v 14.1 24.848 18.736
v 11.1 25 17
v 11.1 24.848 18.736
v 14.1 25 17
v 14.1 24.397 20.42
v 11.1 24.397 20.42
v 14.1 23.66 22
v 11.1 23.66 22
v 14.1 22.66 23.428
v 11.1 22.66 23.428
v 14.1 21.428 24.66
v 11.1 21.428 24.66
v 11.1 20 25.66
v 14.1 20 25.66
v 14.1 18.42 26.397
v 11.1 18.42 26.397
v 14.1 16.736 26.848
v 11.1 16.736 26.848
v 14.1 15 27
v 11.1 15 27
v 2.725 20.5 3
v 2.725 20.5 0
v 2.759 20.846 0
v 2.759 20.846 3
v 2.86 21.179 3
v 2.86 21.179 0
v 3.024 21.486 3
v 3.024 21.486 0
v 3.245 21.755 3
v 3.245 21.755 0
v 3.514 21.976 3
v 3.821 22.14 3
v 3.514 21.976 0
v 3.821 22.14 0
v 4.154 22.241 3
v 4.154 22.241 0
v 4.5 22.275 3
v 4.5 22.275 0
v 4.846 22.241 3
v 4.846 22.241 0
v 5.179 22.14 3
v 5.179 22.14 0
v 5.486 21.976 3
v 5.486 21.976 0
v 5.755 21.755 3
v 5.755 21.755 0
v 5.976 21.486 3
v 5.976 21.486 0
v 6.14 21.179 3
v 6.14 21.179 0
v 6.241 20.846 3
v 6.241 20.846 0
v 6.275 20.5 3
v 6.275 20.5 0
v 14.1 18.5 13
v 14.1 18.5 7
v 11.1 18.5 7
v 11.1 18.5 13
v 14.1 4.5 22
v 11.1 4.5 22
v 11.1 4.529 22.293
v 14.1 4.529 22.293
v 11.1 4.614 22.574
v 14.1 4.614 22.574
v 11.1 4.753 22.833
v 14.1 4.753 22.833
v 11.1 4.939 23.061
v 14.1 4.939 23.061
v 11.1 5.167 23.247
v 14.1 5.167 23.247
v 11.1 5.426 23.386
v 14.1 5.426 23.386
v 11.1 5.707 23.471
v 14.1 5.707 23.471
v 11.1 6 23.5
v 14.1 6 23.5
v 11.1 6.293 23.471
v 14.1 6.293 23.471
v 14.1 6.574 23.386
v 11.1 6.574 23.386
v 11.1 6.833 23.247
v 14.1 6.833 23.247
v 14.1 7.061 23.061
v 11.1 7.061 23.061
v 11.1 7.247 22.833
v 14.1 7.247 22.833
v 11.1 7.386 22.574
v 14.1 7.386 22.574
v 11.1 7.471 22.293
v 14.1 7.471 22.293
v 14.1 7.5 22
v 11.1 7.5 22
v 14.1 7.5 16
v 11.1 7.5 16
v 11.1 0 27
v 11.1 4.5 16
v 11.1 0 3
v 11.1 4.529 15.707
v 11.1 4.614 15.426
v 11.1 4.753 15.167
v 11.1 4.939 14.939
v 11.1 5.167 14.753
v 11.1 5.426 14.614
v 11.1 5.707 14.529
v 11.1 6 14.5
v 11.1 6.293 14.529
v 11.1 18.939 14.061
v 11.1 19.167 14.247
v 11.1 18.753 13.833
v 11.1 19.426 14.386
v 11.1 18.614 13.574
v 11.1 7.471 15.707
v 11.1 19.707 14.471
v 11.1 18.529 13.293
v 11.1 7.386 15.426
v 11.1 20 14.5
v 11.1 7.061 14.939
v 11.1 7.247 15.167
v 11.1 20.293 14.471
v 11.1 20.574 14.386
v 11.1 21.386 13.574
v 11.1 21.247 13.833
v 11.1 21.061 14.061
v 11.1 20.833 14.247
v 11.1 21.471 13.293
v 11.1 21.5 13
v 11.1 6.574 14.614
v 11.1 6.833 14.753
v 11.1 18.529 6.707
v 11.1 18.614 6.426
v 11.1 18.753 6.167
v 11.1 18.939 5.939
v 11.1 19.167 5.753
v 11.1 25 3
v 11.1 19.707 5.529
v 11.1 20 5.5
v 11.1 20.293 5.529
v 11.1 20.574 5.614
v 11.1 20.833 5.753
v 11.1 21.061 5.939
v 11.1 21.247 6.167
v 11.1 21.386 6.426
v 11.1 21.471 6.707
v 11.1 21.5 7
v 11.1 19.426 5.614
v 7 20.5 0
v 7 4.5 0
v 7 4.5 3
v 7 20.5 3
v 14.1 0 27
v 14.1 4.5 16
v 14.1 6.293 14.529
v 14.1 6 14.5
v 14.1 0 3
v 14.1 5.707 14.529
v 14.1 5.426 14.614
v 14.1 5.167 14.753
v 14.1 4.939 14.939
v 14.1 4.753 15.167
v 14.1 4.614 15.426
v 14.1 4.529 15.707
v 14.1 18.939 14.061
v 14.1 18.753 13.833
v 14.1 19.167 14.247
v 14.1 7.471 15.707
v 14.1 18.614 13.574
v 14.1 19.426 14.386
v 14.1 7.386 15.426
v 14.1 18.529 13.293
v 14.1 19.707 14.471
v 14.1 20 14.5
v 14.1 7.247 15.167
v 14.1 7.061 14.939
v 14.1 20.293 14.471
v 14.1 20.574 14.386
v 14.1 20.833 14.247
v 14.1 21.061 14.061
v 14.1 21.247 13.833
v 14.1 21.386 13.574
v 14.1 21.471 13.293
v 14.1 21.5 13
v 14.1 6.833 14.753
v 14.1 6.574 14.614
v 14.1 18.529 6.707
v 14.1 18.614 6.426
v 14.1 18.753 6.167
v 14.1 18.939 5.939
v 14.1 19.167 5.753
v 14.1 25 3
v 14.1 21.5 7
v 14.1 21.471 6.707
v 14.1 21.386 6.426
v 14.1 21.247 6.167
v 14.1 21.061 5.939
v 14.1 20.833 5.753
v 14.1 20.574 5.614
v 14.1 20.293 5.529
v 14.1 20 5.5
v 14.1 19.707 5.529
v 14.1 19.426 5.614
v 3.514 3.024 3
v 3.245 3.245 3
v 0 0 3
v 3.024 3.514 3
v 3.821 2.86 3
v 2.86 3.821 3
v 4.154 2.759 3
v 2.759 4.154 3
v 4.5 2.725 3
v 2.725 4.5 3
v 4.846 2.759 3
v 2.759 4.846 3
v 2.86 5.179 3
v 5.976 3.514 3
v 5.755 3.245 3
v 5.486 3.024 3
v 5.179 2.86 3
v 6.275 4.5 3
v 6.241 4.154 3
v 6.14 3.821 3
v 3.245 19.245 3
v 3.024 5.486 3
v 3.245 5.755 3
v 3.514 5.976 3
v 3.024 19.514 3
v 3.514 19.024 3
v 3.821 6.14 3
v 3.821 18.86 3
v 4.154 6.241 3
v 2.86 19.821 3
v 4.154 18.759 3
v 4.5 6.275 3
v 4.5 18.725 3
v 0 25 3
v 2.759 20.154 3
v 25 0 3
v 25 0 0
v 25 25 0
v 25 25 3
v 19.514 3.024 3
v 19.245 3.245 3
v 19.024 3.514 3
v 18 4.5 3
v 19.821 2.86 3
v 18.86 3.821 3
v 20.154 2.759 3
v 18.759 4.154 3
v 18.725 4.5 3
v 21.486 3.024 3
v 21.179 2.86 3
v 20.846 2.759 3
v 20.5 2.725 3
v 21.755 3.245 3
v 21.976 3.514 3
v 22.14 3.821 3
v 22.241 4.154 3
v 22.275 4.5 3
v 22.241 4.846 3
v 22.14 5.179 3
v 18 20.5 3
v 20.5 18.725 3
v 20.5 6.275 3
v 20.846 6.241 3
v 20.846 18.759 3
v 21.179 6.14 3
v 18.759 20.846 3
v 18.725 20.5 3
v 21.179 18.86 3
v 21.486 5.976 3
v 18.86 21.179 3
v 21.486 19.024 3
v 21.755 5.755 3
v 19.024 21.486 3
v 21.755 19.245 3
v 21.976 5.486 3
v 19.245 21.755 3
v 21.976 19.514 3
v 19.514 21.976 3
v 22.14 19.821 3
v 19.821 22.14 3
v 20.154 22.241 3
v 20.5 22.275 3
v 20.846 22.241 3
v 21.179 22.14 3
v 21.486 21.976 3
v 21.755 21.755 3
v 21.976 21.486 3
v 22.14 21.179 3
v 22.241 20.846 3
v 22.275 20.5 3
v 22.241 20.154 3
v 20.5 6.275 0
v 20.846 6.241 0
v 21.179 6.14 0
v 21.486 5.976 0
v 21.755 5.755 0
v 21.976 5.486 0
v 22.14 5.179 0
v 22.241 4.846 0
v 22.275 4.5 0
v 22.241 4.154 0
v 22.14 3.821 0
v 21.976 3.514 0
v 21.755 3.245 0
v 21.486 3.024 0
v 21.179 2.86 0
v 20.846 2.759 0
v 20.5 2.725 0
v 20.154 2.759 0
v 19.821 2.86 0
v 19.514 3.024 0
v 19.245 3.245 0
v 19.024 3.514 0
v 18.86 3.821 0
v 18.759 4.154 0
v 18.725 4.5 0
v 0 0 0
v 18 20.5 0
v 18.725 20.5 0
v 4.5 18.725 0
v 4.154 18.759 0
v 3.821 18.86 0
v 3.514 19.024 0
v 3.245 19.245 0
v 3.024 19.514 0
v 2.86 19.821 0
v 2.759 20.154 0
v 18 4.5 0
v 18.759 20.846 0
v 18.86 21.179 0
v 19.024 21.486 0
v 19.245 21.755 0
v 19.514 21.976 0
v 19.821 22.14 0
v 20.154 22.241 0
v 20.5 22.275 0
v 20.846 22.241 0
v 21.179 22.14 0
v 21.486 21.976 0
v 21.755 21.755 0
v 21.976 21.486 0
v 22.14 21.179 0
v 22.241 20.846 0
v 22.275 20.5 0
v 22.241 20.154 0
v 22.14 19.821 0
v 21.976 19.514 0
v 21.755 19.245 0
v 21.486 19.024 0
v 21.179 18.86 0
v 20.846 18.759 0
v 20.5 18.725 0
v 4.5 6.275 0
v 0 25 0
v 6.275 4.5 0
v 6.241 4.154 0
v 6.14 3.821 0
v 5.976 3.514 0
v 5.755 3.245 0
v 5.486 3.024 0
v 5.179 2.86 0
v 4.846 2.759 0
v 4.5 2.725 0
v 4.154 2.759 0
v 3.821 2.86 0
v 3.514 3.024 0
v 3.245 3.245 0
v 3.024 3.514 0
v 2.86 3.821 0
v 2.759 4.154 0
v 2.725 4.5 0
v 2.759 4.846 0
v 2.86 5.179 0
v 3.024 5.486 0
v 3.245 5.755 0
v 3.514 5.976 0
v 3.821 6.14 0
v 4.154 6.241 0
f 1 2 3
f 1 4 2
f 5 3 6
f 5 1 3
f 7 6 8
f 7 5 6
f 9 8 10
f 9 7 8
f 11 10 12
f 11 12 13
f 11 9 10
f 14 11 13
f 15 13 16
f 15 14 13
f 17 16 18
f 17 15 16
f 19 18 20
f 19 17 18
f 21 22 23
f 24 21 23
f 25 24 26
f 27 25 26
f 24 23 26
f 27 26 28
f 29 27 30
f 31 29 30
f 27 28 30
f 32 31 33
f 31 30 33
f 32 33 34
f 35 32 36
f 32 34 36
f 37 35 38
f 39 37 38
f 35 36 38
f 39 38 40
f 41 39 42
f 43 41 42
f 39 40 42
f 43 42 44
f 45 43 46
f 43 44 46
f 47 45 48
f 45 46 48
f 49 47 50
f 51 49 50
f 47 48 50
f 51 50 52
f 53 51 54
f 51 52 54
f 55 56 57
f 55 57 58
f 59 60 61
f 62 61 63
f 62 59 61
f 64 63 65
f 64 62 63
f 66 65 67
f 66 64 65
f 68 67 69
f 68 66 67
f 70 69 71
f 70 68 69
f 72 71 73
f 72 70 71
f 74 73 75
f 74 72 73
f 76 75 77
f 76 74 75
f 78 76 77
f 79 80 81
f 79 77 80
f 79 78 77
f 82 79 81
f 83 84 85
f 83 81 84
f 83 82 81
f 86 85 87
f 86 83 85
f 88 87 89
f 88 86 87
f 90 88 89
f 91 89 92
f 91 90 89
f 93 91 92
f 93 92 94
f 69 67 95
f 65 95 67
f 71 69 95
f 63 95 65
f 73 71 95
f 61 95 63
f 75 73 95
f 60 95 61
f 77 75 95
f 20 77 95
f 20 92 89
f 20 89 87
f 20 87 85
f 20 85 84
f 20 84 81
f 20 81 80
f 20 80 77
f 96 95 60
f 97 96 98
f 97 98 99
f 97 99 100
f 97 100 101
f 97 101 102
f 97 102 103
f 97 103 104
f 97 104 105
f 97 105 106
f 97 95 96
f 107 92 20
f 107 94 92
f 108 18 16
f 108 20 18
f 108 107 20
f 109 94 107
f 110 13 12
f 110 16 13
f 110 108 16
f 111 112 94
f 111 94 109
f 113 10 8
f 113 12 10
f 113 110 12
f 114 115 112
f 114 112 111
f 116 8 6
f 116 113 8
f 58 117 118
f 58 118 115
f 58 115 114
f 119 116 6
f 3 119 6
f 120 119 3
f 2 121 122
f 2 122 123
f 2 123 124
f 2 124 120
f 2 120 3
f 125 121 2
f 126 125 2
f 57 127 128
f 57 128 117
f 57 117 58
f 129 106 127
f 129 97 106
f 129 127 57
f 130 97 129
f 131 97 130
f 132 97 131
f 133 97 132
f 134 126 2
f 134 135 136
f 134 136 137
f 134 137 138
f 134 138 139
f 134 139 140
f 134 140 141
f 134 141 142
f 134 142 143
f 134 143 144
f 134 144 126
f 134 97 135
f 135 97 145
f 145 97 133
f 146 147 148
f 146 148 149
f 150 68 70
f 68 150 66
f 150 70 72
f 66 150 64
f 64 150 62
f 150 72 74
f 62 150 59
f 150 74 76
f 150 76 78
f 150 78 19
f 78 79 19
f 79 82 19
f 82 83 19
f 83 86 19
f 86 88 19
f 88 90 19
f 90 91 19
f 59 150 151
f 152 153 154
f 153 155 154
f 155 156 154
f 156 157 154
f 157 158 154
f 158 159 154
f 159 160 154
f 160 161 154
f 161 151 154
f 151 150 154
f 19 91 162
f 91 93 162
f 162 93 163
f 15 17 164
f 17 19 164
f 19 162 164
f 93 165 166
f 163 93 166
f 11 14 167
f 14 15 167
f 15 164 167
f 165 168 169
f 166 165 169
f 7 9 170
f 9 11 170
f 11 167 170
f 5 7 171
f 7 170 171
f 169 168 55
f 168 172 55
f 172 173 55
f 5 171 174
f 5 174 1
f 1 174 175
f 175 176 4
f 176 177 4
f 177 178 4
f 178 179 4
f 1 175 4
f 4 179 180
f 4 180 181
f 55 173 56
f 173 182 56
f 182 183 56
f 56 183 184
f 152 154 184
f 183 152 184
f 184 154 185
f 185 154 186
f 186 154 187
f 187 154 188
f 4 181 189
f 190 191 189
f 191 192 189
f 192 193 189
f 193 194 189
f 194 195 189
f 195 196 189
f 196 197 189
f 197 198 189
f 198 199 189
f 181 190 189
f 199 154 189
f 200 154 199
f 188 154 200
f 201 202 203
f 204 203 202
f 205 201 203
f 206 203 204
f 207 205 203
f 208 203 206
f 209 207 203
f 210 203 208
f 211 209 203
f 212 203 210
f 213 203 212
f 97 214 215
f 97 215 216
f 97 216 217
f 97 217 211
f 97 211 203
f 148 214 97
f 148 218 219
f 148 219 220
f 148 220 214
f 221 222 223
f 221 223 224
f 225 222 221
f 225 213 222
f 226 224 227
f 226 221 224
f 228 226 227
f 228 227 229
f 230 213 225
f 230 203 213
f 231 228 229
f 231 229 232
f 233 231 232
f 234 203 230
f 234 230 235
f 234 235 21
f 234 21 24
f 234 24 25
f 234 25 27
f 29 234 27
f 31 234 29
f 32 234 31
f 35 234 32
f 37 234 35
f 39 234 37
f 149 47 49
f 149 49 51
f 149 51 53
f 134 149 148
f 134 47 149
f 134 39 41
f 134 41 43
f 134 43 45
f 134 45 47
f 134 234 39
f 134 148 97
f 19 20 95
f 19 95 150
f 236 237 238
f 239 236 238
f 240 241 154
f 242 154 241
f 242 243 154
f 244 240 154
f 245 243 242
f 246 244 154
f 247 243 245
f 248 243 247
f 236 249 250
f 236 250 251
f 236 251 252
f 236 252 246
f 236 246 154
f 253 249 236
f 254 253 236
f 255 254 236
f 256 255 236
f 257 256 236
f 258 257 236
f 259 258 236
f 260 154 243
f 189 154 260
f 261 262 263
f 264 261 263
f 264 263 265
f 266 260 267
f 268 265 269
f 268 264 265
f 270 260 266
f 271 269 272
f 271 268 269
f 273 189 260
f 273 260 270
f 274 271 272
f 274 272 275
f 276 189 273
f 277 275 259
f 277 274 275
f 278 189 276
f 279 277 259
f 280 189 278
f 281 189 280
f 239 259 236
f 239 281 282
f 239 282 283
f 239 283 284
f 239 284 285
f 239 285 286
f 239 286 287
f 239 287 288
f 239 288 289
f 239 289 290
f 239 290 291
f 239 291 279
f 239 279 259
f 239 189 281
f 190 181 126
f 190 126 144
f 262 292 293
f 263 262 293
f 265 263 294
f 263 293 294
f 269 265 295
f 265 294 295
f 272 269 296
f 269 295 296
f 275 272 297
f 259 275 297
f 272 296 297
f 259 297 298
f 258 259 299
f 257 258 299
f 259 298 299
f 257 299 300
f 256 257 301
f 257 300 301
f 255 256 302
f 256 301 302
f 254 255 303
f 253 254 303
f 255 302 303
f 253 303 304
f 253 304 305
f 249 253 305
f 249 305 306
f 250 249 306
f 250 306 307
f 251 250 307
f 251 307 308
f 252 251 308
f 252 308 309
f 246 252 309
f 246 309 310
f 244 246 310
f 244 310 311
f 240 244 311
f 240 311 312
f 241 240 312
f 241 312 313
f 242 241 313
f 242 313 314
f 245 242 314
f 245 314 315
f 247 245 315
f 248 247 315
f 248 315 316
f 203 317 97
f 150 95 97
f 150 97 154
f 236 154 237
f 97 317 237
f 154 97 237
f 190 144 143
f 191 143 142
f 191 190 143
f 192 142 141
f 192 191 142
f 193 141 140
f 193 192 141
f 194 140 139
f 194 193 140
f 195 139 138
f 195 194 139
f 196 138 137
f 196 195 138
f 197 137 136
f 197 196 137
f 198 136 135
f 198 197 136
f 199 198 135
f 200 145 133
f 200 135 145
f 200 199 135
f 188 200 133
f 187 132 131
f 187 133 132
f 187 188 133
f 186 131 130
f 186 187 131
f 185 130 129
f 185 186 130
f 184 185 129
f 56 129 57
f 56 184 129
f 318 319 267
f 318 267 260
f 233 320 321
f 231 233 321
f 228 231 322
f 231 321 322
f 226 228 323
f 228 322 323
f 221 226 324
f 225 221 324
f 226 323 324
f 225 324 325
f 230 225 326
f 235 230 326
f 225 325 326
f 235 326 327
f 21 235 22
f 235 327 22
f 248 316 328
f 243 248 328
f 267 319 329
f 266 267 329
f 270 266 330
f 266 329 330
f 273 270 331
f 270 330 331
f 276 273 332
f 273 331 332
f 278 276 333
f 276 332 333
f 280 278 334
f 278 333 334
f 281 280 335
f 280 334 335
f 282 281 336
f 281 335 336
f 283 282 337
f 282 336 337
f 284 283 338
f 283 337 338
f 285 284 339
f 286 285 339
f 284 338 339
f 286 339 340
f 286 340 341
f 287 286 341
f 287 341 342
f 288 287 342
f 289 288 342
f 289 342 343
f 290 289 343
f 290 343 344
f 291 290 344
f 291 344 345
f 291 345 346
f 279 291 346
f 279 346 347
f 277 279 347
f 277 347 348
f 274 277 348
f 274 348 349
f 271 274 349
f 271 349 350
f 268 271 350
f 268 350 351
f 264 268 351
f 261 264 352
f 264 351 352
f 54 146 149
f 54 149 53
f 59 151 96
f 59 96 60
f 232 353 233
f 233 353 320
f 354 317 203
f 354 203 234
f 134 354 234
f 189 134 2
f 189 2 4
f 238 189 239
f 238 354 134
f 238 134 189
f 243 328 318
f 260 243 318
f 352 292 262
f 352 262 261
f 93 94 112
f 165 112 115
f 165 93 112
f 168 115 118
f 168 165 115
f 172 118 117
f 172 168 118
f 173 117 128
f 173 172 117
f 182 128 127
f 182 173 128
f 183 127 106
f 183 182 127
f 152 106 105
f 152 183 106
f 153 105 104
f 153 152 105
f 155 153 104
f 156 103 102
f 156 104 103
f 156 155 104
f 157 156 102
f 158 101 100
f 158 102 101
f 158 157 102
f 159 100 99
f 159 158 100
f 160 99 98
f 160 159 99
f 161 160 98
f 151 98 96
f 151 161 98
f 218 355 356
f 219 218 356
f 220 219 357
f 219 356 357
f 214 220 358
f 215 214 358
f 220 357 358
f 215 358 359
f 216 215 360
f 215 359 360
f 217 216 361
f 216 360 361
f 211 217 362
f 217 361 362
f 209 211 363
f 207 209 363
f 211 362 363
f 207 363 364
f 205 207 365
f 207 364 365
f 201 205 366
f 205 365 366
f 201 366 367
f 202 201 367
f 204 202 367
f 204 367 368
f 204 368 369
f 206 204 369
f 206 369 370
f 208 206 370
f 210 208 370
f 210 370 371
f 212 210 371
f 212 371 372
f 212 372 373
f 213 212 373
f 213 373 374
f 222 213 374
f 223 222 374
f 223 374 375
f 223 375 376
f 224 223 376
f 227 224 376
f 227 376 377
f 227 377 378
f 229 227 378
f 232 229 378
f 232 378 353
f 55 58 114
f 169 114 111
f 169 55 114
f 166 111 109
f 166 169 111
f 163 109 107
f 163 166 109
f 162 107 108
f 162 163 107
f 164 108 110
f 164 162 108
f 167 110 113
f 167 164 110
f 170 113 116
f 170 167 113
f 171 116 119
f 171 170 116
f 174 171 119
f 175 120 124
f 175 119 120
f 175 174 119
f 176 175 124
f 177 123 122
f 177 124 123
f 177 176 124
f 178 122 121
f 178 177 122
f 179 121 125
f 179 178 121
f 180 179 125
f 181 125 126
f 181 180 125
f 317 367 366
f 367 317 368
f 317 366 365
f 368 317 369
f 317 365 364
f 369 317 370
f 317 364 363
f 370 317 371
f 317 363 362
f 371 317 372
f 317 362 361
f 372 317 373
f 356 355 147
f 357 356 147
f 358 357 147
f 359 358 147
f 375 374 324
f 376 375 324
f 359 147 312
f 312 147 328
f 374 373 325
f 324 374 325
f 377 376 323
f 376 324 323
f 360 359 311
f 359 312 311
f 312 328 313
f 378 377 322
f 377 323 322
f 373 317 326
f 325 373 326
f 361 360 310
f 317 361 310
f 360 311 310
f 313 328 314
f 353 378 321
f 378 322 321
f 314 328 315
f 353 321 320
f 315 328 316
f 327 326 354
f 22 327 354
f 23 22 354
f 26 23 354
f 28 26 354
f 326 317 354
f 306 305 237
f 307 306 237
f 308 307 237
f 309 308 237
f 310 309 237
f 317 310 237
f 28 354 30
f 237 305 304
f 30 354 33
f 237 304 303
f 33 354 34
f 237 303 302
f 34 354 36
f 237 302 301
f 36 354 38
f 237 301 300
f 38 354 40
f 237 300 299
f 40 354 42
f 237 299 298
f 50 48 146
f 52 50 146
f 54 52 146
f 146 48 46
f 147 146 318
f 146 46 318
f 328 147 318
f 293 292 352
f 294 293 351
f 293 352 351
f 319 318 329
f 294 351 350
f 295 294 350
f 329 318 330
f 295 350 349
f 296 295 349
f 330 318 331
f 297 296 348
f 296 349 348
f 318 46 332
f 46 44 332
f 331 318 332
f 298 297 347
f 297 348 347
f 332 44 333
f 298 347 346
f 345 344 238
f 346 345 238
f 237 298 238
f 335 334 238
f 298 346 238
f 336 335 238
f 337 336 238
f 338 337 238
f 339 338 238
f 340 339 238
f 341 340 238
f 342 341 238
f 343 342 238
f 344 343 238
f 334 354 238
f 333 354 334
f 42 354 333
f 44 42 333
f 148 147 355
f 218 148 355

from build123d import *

# Parameters (mm, degrees)
ESQUISSE1_W             = 25
ESQUISSE1_H             = 25
BOSS_EXTRU_1_DEPTH      = 3
ESQUISSE4_R             = 1.775
ESQUISSE4_W             = 2.5
ESQUISSE4_H             = 16
ENL_V_MAT_EXTRU_1_DEPTH = 10
ESQUISSE5_W             = 3
ESQUISSE5_H             = 25
BOSS_EXTRU_3_DEPTH      = 24
ENL_V_MAT_EXTRU_2_DEPTH = 10
CONG_1_R                = 10


with BuildPart() as part:
    # Esquisse1 → Boss.-Extru.1 (new body)
    with BuildSketch(Plane.XY):
        with Locations((12.5, 12.5)):
            Rectangle(ESQUISSE1_W, ESQUISSE1_H)
    extrude(amount=BOSS_EXTRU_1_DEPTH)

    # Esquisse4 → Enlèv. mat.-Extru.1 (cut)
    with BuildSketch(Plane(origin=(0, 0, 0), x_dir=(-1, 0, 0), z_dir=(0, 0, -1))):
        with BuildLine():
            Line((-20.5, 6.275), (-20.5, 4.5))
            Line((-20.5, 4.5), (-18.725, 4.5))
            ThreePointArc((-18.725, 4.5), (-19.244885463, 5.755114537), (-20.5, 6.275))
        make_face()
        with BuildLine():
            Line((-18.725, 4.5), (-20.5, 4.5))
            Line((-20.5, 4.5), (-20.5, 6.275))
            ThreePointArc((-20.5, 6.275), (-21.755114537, 3.244885463), (-18.725, 4.5))
        make_face()
        with Locations((-20.5, 20.5)):
            Circle(ESQUISSE4_R)
        with Locations((-20.5, 4.5)):
            Circle(ESQUISSE4_R)
        with Locations((-19.25, 12.5)):
            Rectangle(ESQUISSE4_W, ESQUISSE4_H)
        with BuildLine():
            ThreePointArc((-18.725, 20.5), (-21.755114537, 21.755114537), (-20.5, 18.725))
            Line((-20.5, 18.725), (-20.5, 20.5))
            Line((-20.5, 20.5), (-18.725, 20.5))
        make_face()
        with BuildLine():
            Line((-20.5, 20.5), (-20.5, 18.725))
            ThreePointArc((-20.5, 18.725), (-19.244885463, 19.244885463), (-18.725, 20.5))
            Line((-18.725, 20.5), (-20.5, 20.5))
        make_face()
        with BuildLine():
            Line((-4.5, 18.725), (-4.5, 20.5))
            Line((-4.5, 20.5), (-6.275, 20.5))
            ThreePointArc((-6.275, 20.5), (-5.755114537, 19.244885463), (-4.5, 18.725))
        make_face()
        with BuildLine():
            Line((-6.275, 20.5), (-4.5, 20.5))
            Line((-4.5, 20.5), (-4.5, 18.725))
            ThreePointArc((-4.5, 18.725), (-3.244885463, 19.244885463), (-2.725, 20.5))
            ThreePointArc((-2.725, 20.5), (-4.5, 22.275), (-6.275, 20.5))
        make_face()
        with Locations((-4.5, 4.5)):
            Circle(ESQUISSE4_R)
        with Locations((-4.5, 20.5)):
            Circle(ESQUISSE4_R)
        with Locations((-5.75, 12.5)):
            Rectangle(ESQUISSE4_W, ESQUISSE4_H)
        with BuildLine():
            ThreePointArc((-2.725, 4.5), (-3.244885463, 5.755114537), (-4.5, 6.275))
            Line((-4.5, 6.275), (-4.5, 4.5))
            Line((-4.5, 4.5), (-6.275, 4.5))
            ThreePointArc((-6.275, 4.5), (-4.5, 2.725), (-2.725, 4.5))
        make_face()
        with BuildLine():
            Line((-4.5, 4.5), (-4.5, 6.275))
            ThreePointArc((-4.5, 6.275), (-5.755114537, 5.755114537), (-6.275, 4.5))
            Line((-6.275, 4.5), (-4.5, 4.5))
        make_face()
    extrude(amount=-ENL_V_MAT_EXTRU_1_DEPTH, mode=Mode.SUBTRACT)

    # Esquisse5 → Boss.-Extru.3 (add)
    with BuildSketch(Plane.XY.offset(3)):
        with Locations((12.6, 12.5)):
            Rectangle(ESQUISSE5_W, ESQUISSE5_H)
    extrude(amount=BOSS_EXTRU_3_DEPTH)

    # Esquisse6 → Enlèv. mat.-Extru.2 (cut)
    with BuildSketch(Plane(origin=(14.1, 0, 0), x_dir=(0, 0, -1), z_dir=(1, 0, 0))):
        with BuildLine():
            Line((-22, 7.5), (-16, 7.5))
            ThreePointArc((-16, 7.5), (-14.5, 6), (-16, 4.5))
            Line((-16, 4.5), (-22, 4.5))
            ThreePointArc((-22, 4.5), (-23.5, 6), (-22, 7.5))
        make_face()
        with BuildLine():
            Line((-7, 18.5), (-13, 18.5))
            ThreePointArc((-13, 18.5), (-14.5, 20), (-13, 21.5))
            Line((-13, 21.5), (-7, 21.5))
            ThreePointArc((-7, 21.5), (-5.5, 20), (-7, 18.5))
        make_face()
    extrude(amount=-ENL_V_MAT_EXTRU_2_DEPTH, mode=Mode.SUBTRACT)

    # Congé1
    cong_1_edges = [part.edges().sort_by_distance(p)[0] for p in [
        (12.6, 25, 27),
    ]]
    fillet(cong_1_edges, radius=CONG_1_R)


solid = part.part
